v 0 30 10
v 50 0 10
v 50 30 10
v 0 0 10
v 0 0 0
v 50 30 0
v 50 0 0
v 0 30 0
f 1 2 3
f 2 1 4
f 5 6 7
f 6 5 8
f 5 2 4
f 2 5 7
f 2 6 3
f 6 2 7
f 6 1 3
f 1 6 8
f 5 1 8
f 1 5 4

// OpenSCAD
// Basic_Shape_02.scad
// Rectangular Solid

// cube : x,y,z 
// width = 50
// depth = 30 (length)
// height = 10
cube ([50,30,10]);
